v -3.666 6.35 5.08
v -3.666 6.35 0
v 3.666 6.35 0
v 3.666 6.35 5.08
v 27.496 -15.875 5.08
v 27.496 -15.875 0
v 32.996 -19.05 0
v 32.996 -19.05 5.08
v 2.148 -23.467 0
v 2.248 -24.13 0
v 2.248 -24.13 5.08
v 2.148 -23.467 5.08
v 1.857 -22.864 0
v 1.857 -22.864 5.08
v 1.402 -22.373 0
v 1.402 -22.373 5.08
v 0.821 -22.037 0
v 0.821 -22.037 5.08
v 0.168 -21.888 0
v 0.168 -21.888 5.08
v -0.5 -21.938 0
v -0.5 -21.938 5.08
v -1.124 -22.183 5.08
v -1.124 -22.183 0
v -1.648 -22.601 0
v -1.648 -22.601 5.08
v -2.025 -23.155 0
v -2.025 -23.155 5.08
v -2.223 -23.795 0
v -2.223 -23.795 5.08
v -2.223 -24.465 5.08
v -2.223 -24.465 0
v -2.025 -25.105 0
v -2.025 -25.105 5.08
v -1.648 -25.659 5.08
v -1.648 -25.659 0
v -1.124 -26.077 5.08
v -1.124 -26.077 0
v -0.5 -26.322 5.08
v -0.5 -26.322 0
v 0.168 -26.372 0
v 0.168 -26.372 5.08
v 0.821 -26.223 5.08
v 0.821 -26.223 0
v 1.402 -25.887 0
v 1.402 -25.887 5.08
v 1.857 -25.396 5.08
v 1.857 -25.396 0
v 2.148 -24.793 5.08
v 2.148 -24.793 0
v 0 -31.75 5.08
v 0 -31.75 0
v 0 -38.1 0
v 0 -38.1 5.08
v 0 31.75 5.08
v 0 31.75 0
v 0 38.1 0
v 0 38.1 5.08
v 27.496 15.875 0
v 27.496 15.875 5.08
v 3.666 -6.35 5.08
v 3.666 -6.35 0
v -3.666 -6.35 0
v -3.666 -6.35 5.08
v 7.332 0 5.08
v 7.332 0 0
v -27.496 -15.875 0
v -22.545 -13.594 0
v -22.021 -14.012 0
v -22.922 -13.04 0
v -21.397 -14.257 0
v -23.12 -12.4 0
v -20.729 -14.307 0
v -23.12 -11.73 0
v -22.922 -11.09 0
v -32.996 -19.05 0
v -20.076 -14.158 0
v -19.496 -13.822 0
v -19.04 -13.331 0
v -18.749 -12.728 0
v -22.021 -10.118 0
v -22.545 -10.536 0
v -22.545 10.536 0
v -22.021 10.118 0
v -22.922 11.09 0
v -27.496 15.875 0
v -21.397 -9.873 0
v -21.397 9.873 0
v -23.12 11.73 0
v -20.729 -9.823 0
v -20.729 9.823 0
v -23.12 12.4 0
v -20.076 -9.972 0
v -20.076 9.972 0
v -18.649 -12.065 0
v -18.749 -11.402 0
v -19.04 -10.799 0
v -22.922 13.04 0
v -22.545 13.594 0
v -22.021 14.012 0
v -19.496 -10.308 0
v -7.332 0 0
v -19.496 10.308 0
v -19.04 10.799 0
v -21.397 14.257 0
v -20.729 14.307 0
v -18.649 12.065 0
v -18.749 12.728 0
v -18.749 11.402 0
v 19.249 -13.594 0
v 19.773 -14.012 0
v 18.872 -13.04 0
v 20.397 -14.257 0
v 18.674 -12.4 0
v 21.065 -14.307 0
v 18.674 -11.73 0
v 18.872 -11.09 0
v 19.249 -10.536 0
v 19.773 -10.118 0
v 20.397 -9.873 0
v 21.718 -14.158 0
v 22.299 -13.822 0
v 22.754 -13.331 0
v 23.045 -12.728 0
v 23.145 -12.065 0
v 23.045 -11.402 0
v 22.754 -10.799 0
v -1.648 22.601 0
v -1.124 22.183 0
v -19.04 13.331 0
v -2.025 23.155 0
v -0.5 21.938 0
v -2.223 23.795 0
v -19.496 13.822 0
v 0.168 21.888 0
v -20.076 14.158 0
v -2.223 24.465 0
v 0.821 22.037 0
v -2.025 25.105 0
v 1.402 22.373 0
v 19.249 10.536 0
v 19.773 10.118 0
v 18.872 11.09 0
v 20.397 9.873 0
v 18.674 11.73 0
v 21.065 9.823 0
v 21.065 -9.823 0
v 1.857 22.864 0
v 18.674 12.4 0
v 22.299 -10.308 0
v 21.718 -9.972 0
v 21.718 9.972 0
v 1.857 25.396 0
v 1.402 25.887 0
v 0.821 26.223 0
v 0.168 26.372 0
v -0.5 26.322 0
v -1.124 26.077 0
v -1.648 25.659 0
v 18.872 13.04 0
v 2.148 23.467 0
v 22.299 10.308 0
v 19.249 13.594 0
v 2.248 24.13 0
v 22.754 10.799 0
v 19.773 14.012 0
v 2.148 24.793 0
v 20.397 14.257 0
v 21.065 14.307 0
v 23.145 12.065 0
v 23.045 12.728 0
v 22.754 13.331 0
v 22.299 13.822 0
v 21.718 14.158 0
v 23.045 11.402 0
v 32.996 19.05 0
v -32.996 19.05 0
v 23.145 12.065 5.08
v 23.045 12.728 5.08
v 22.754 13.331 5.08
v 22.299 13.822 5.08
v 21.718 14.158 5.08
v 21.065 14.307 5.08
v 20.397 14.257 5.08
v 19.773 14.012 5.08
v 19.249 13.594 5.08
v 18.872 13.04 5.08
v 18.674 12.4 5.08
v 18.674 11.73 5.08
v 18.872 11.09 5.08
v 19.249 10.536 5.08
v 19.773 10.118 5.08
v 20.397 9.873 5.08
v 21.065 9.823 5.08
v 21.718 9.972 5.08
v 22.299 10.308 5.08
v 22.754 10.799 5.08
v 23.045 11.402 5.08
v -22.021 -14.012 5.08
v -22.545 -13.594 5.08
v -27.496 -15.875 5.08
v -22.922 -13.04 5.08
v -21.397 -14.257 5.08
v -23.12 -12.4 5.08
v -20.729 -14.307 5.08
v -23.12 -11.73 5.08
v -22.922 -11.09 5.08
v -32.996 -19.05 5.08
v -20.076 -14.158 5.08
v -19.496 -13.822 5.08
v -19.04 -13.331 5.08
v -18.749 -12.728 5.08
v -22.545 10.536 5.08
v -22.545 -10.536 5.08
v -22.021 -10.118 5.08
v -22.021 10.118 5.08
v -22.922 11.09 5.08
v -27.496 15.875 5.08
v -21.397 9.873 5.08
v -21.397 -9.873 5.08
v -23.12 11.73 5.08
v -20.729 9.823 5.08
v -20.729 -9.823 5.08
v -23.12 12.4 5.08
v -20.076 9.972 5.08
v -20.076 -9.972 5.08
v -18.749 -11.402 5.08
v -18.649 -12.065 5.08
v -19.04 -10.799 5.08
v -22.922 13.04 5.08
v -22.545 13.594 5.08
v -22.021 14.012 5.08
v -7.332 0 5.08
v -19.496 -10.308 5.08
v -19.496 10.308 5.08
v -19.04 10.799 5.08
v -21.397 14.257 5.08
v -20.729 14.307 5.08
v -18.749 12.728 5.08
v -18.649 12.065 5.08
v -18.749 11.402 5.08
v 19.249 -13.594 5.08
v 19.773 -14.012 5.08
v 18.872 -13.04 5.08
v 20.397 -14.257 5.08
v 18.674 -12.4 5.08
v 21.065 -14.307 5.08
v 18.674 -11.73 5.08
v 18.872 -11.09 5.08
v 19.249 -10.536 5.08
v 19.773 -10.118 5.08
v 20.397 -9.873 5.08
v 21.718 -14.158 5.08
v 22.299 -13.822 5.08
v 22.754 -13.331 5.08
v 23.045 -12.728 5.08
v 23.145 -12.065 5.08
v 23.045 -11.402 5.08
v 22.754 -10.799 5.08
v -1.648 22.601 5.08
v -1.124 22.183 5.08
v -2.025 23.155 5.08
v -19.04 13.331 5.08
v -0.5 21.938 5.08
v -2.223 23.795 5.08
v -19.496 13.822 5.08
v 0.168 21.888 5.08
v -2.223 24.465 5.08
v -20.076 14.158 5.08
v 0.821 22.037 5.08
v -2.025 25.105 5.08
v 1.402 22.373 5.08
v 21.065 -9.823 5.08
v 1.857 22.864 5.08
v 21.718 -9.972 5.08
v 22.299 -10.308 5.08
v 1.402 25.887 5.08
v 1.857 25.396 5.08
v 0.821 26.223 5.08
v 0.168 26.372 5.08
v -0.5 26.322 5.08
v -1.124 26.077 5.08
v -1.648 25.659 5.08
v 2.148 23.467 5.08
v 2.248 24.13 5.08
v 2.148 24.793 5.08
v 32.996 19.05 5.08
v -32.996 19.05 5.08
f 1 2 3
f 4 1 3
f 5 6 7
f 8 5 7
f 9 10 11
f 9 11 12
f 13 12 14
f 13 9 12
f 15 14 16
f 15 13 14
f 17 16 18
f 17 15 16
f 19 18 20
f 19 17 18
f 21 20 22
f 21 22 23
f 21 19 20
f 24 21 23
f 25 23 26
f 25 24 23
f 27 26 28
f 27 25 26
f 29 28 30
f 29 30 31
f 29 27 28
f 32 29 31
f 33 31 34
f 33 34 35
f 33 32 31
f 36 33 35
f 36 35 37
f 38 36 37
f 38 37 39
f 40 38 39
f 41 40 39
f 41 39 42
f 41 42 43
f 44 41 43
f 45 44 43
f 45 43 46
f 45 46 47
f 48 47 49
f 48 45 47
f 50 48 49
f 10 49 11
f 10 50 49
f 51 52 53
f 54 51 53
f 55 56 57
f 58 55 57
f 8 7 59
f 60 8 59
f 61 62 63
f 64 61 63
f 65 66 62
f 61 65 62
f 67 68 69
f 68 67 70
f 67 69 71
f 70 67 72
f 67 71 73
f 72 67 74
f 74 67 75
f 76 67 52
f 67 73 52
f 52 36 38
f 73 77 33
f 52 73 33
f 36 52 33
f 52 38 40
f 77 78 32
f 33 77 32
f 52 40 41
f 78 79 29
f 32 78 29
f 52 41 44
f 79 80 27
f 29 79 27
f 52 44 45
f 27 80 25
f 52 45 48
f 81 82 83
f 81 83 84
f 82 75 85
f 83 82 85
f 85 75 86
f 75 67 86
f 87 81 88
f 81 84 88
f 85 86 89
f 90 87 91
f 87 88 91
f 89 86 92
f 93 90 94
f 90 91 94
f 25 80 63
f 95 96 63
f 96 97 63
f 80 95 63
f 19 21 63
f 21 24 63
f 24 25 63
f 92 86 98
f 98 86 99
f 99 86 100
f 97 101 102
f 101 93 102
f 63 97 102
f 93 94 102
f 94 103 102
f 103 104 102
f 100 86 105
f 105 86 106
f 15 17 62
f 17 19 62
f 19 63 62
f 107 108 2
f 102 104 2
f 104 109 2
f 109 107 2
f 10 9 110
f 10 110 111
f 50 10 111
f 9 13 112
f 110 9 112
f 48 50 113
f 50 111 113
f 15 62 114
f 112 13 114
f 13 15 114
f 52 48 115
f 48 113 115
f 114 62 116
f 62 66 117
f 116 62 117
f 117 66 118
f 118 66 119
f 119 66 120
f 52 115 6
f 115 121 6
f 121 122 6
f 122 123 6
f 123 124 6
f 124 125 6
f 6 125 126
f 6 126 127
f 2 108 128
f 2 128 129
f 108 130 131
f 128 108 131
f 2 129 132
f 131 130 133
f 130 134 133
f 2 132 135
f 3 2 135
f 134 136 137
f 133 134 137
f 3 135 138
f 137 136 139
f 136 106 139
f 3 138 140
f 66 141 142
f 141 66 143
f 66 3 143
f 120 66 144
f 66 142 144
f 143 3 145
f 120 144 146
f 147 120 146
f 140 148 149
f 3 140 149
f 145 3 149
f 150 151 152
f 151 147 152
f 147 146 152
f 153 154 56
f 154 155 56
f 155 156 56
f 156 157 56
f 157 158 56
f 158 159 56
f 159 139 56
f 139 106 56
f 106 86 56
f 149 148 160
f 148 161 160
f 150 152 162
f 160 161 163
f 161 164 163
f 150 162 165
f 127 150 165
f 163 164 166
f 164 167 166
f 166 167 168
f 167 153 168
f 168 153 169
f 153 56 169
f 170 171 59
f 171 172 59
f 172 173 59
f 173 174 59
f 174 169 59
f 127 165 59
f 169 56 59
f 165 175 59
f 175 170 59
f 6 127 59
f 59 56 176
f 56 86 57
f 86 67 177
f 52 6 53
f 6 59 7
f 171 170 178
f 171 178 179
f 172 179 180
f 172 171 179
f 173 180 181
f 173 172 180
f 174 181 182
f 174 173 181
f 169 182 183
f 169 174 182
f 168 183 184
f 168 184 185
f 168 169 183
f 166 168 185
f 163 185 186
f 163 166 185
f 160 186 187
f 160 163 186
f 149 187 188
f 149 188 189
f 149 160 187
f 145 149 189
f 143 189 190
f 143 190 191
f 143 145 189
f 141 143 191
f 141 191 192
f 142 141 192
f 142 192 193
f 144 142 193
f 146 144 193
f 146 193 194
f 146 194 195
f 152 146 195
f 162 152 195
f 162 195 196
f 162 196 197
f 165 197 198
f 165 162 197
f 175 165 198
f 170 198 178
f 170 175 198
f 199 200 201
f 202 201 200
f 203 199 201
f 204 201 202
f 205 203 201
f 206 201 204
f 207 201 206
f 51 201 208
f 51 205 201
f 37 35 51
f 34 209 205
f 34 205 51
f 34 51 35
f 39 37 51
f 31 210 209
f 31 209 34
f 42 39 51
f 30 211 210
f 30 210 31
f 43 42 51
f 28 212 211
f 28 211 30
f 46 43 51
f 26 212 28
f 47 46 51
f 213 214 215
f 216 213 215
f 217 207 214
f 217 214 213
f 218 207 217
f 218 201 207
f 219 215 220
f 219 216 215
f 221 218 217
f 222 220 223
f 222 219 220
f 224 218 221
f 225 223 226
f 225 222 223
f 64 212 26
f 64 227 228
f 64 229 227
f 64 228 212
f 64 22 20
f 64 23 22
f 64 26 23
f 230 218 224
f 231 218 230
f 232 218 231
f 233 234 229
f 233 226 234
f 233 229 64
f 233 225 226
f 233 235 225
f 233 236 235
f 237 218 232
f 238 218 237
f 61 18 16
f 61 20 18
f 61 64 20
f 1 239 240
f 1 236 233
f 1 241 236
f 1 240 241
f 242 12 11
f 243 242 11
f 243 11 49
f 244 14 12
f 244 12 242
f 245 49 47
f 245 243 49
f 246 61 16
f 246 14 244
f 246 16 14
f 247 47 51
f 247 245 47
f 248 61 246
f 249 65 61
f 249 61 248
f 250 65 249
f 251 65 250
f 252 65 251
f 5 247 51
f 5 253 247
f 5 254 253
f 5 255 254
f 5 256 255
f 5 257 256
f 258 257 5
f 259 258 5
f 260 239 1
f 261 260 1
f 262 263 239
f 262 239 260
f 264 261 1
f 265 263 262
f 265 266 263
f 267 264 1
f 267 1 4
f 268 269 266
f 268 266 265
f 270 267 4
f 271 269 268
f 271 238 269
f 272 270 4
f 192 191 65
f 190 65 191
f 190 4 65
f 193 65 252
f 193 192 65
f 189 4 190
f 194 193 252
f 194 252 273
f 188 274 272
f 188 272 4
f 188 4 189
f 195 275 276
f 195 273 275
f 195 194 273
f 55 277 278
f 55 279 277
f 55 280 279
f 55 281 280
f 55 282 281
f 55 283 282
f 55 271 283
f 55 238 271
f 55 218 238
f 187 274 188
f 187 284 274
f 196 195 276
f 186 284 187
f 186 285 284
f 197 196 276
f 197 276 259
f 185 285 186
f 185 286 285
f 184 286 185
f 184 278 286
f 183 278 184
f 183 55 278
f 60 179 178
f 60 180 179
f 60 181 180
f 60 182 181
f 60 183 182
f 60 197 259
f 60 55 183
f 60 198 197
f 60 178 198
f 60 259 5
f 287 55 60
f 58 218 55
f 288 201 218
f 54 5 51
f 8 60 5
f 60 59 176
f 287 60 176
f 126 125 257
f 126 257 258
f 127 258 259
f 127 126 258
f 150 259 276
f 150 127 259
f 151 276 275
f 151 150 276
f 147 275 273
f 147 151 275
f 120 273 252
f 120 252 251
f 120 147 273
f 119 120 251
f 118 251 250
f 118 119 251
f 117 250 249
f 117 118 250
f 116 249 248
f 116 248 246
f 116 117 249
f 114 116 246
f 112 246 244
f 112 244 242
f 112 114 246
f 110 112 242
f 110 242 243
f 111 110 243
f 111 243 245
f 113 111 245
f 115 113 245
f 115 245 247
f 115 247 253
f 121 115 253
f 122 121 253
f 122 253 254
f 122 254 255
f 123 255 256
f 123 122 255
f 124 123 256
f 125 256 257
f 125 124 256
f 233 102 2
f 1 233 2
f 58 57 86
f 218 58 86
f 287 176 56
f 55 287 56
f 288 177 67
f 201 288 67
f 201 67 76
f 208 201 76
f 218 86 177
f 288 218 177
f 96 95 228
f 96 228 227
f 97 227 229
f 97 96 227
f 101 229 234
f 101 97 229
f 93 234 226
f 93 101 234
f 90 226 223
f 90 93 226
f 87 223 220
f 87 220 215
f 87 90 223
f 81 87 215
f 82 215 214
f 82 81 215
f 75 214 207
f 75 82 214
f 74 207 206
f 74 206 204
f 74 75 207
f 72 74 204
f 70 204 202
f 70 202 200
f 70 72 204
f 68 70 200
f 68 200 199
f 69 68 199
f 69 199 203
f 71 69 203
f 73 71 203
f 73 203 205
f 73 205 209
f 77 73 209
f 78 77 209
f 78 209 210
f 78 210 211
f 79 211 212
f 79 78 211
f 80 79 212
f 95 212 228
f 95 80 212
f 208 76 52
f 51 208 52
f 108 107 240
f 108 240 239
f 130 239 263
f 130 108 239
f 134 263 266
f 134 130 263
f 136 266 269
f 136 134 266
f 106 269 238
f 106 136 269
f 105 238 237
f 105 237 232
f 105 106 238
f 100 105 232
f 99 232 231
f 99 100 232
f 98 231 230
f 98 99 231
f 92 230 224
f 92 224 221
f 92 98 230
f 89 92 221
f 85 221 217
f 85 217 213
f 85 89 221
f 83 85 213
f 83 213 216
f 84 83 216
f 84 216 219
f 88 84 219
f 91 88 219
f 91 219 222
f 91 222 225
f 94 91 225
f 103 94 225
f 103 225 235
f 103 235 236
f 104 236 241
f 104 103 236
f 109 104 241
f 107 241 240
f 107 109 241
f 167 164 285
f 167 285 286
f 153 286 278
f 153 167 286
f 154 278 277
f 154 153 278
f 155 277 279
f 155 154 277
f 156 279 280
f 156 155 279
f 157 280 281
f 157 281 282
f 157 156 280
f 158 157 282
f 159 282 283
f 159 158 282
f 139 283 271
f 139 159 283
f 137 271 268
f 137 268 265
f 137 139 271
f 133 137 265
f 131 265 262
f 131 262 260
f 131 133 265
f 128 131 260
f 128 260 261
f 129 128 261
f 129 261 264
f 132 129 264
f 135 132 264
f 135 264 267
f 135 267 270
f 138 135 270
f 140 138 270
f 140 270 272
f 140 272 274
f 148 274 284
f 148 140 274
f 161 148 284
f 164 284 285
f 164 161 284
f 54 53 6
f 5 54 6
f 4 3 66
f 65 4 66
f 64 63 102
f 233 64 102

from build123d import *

# Parameters (mm, degrees)
F0_R     = 2.2479
F1_DEPTH = 5.08


with BuildPart() as f1:
    # F0 (on Top) → F1 (new body)
    with BuildSketch(Plane.XY):
        Polygon((0, 31.75), (0, 38.1), (-27.496307, 15.875), (-32.995568, 19.05), (-27.496307, -15.875), (-32.995568, -19.05), (0, -31.75), (0, -38.1), (27.496307, -15.875), (32.995568, -19.05), (27.496307, 15.875), (32.995568, 19.05), align=None)
        with Locations((-20.897193, -12.065)):
            Circle(F0_R, mode=Mode.SUBTRACT)
        with Locations((0, -24.13)):
            Circle(F0_R, mode=Mode.SUBTRACT)
        with Locations((20.897193, -12.065)):
            Circle(F0_R, mode=Mode.SUBTRACT)
        with Locations((-20.897193, 12.065)):
            Circle(F0_R, mode=Mode.SUBTRACT)
        Polygon((-7.332348, 0), (-3.666174, 6.35), (3.666174, 6.35), (7.332348, 0), (3.666174, -6.35), (-3.666174, -6.35), align=None, mode=Mode.SUBTRACT)
        with Locations((20.897193, 12.065)):
            Circle(F0_R, mode=Mode.SUBTRACT)
        with Locations((0, 24.13)):
            Circle(F0_R, mode=Mode.SUBTRACT)
    extrude(amount=F1_DEPTH)


solid = f1.part
